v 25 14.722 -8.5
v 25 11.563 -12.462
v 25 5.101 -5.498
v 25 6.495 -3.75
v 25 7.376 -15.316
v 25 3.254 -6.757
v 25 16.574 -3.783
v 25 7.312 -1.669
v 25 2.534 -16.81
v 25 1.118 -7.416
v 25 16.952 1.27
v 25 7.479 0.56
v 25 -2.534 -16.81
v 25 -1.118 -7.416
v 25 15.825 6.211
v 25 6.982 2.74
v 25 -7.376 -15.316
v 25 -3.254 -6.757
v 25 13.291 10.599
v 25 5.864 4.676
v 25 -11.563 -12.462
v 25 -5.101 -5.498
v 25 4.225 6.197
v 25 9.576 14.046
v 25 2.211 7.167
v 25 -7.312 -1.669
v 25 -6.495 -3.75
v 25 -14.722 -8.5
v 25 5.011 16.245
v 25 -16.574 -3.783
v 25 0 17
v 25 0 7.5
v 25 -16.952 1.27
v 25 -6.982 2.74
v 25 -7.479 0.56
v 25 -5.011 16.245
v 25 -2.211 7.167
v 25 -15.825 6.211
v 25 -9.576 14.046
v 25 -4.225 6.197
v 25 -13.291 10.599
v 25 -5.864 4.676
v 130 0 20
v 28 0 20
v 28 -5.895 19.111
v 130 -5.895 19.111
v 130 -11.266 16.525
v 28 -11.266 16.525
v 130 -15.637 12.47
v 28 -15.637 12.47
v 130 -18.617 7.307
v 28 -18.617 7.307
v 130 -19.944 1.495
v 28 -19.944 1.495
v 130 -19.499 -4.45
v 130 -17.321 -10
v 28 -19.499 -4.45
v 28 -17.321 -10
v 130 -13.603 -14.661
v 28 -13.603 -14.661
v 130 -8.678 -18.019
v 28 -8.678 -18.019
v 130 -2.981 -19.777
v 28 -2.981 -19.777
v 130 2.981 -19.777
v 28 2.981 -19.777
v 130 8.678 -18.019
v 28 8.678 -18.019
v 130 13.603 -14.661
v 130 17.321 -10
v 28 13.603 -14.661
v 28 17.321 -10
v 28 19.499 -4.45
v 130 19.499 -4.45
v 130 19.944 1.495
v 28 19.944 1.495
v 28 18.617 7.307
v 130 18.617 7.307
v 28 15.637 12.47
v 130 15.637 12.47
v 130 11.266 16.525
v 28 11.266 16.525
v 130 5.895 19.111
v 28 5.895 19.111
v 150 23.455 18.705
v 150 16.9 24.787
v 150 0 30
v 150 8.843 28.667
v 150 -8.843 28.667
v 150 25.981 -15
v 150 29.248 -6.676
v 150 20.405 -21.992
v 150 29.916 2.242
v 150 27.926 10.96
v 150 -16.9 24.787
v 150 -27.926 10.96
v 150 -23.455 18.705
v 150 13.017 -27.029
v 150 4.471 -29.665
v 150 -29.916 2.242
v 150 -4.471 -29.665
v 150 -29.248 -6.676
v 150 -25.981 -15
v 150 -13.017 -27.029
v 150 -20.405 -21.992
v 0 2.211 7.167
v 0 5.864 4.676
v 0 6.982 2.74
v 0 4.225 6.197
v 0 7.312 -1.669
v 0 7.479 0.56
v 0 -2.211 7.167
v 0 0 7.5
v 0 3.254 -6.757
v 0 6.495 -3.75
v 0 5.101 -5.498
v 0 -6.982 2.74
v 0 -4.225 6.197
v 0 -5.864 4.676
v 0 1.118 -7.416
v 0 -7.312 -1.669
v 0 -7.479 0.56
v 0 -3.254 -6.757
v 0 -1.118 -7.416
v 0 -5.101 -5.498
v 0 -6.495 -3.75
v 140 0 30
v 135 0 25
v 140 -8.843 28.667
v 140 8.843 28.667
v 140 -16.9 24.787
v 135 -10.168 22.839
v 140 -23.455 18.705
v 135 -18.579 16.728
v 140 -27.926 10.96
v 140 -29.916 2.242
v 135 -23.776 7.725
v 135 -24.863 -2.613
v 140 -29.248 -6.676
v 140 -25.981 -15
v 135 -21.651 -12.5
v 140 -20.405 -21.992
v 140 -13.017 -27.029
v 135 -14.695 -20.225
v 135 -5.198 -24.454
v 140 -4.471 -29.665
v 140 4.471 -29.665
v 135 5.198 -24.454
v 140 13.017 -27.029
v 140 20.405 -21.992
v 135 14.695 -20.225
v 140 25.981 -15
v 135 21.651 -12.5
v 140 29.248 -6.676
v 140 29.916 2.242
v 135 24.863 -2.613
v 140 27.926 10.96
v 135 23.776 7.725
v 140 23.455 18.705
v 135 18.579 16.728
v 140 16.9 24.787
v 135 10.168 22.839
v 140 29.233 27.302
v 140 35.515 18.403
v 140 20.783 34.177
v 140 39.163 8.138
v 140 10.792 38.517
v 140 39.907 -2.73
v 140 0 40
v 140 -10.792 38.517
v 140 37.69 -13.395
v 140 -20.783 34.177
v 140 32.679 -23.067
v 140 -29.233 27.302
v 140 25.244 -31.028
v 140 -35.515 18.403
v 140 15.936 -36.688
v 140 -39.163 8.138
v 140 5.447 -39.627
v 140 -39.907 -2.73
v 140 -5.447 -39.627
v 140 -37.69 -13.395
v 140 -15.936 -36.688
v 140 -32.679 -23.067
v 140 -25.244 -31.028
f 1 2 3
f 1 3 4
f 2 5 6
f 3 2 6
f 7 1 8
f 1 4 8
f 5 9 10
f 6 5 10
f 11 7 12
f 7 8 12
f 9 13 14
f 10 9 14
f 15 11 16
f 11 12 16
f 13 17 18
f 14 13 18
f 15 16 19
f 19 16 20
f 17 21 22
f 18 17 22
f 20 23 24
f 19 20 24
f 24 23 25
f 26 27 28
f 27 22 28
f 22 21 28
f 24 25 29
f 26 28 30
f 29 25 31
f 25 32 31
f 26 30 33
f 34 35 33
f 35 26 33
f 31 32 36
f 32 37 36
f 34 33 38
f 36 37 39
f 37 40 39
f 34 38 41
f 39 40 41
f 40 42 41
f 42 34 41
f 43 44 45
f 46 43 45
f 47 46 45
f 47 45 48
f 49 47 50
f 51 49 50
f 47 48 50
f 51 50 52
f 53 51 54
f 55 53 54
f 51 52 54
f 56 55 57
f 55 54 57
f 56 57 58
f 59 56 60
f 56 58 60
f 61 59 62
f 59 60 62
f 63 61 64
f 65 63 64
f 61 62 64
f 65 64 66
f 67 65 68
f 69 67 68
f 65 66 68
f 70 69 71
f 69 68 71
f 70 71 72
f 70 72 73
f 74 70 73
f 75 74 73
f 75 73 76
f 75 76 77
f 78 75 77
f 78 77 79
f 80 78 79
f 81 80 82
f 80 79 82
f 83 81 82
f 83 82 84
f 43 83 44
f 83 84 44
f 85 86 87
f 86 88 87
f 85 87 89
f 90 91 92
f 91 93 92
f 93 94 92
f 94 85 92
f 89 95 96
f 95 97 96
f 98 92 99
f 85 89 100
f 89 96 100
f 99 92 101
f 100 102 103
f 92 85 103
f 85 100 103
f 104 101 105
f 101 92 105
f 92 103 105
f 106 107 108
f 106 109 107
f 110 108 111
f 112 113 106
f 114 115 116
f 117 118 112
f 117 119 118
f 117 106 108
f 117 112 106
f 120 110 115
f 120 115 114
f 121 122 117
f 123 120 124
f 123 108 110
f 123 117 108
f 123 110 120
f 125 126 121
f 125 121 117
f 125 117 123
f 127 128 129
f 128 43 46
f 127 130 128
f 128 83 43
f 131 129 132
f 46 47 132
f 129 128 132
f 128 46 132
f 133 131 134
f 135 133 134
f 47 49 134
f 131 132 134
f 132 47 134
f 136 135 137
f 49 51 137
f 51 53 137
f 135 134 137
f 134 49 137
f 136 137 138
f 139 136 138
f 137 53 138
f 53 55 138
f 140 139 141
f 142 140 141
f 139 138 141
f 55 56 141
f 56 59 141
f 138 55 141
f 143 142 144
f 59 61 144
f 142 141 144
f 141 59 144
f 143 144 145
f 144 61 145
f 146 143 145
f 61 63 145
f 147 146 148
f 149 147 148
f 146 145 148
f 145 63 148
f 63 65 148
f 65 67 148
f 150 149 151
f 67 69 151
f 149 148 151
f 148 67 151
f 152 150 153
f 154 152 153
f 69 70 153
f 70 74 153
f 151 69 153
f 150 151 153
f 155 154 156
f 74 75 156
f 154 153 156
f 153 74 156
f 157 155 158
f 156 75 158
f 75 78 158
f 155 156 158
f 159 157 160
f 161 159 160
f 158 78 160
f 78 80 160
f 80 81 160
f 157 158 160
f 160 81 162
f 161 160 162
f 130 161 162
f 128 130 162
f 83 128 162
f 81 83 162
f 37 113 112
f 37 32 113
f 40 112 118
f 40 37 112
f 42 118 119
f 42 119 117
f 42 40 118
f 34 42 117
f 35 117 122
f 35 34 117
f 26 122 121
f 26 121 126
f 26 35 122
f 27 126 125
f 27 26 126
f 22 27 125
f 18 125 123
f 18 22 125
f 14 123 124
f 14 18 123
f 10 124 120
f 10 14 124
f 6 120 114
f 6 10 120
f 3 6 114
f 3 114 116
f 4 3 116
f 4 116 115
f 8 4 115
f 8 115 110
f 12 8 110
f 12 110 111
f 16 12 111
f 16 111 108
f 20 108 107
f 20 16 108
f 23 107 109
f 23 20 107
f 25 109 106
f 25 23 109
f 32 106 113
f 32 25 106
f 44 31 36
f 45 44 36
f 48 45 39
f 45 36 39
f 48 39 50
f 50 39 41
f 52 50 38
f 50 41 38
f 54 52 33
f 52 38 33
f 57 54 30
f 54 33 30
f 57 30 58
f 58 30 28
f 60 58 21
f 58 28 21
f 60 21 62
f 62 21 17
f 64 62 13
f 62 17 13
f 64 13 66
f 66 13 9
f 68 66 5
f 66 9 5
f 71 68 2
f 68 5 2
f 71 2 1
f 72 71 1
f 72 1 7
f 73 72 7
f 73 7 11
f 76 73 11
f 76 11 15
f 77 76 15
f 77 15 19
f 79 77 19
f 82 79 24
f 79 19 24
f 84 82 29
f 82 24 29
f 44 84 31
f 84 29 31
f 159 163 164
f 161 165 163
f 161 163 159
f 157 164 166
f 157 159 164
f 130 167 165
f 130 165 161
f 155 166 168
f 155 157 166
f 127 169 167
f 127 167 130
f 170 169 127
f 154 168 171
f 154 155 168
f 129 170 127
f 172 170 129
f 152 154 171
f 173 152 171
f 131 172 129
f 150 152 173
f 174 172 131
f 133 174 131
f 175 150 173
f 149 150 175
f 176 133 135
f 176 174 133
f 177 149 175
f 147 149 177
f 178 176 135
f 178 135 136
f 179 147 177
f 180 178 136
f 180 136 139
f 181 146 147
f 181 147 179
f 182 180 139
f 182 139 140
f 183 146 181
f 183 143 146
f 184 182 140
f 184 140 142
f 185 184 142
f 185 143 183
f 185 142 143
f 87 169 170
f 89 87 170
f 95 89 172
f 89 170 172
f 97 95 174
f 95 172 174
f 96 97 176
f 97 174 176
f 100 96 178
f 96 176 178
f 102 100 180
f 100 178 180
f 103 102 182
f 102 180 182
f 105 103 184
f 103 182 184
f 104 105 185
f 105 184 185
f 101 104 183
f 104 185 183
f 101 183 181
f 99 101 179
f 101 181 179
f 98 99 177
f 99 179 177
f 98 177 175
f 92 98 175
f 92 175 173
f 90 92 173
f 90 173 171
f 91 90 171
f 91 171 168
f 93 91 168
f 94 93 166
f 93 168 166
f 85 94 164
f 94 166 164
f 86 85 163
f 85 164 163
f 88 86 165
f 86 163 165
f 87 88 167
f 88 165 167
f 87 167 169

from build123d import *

# Parameters (mm, degrees)
SKETCH_1_W     = 25
SKETCH_1_H     = 7.5
SKETCH_1_W_2   = 10
SKETCH_1_H_2   = 40
CHAMFER_1_SIZE = 10
CHAMFER_2_SIZE = 10
CHAMFER_3_SIZE = 3


with BuildPart() as part:
    # 草圖1 → 迴轉1 (revolve)
    with BuildSketch(Plane.XY, mode=Mode.PRIVATE) as revolve_1_sk:
        with Locations((12.5, 3.75)):
            Rectangle(SKETCH_1_W, SKETCH_1_H)
        with Locations((145, 20)):
            Rectangle(SKETCH_1_W_2, SKETCH_1_H_2)
        Polygon((25, 7.5), (25, 0), (140, 0), (140, 20), (25, 20), align=None)
    revolve(revolve_1_sk.sketch.rotate(Axis((25, 0, 0), (1, 0, 0)), 90), axis=Axis((25, 0, 0), (1, 0, 0)))

    # 倒角1
    chamfer_1_edges = [part.edges().sort_by_distance(p)[0] for p in [
        (150, 0, -40),
    ]]
    chamfer(chamfer_1_edges, length=CHAMFER_1_SIZE - 0.0001)  # a hair under: the kernel refuses the full size

    # 倒角2
    chamfer_2_edges = [part.edges().sort_by_distance(p)[0] for p in [
        (140, 0, -20),
    ]]
    chamfer(chamfer_2_edges, length=CHAMFER_2_SIZE)

    # 倒角3
    chamfer_3_edges = [part.edges().sort_by_distance(p)[0] for p in [
        (25, 0, -20),
    ]]
    chamfer(chamfer_3_edges, length=CHAMFER_3_SIZE)


solid = part.part
